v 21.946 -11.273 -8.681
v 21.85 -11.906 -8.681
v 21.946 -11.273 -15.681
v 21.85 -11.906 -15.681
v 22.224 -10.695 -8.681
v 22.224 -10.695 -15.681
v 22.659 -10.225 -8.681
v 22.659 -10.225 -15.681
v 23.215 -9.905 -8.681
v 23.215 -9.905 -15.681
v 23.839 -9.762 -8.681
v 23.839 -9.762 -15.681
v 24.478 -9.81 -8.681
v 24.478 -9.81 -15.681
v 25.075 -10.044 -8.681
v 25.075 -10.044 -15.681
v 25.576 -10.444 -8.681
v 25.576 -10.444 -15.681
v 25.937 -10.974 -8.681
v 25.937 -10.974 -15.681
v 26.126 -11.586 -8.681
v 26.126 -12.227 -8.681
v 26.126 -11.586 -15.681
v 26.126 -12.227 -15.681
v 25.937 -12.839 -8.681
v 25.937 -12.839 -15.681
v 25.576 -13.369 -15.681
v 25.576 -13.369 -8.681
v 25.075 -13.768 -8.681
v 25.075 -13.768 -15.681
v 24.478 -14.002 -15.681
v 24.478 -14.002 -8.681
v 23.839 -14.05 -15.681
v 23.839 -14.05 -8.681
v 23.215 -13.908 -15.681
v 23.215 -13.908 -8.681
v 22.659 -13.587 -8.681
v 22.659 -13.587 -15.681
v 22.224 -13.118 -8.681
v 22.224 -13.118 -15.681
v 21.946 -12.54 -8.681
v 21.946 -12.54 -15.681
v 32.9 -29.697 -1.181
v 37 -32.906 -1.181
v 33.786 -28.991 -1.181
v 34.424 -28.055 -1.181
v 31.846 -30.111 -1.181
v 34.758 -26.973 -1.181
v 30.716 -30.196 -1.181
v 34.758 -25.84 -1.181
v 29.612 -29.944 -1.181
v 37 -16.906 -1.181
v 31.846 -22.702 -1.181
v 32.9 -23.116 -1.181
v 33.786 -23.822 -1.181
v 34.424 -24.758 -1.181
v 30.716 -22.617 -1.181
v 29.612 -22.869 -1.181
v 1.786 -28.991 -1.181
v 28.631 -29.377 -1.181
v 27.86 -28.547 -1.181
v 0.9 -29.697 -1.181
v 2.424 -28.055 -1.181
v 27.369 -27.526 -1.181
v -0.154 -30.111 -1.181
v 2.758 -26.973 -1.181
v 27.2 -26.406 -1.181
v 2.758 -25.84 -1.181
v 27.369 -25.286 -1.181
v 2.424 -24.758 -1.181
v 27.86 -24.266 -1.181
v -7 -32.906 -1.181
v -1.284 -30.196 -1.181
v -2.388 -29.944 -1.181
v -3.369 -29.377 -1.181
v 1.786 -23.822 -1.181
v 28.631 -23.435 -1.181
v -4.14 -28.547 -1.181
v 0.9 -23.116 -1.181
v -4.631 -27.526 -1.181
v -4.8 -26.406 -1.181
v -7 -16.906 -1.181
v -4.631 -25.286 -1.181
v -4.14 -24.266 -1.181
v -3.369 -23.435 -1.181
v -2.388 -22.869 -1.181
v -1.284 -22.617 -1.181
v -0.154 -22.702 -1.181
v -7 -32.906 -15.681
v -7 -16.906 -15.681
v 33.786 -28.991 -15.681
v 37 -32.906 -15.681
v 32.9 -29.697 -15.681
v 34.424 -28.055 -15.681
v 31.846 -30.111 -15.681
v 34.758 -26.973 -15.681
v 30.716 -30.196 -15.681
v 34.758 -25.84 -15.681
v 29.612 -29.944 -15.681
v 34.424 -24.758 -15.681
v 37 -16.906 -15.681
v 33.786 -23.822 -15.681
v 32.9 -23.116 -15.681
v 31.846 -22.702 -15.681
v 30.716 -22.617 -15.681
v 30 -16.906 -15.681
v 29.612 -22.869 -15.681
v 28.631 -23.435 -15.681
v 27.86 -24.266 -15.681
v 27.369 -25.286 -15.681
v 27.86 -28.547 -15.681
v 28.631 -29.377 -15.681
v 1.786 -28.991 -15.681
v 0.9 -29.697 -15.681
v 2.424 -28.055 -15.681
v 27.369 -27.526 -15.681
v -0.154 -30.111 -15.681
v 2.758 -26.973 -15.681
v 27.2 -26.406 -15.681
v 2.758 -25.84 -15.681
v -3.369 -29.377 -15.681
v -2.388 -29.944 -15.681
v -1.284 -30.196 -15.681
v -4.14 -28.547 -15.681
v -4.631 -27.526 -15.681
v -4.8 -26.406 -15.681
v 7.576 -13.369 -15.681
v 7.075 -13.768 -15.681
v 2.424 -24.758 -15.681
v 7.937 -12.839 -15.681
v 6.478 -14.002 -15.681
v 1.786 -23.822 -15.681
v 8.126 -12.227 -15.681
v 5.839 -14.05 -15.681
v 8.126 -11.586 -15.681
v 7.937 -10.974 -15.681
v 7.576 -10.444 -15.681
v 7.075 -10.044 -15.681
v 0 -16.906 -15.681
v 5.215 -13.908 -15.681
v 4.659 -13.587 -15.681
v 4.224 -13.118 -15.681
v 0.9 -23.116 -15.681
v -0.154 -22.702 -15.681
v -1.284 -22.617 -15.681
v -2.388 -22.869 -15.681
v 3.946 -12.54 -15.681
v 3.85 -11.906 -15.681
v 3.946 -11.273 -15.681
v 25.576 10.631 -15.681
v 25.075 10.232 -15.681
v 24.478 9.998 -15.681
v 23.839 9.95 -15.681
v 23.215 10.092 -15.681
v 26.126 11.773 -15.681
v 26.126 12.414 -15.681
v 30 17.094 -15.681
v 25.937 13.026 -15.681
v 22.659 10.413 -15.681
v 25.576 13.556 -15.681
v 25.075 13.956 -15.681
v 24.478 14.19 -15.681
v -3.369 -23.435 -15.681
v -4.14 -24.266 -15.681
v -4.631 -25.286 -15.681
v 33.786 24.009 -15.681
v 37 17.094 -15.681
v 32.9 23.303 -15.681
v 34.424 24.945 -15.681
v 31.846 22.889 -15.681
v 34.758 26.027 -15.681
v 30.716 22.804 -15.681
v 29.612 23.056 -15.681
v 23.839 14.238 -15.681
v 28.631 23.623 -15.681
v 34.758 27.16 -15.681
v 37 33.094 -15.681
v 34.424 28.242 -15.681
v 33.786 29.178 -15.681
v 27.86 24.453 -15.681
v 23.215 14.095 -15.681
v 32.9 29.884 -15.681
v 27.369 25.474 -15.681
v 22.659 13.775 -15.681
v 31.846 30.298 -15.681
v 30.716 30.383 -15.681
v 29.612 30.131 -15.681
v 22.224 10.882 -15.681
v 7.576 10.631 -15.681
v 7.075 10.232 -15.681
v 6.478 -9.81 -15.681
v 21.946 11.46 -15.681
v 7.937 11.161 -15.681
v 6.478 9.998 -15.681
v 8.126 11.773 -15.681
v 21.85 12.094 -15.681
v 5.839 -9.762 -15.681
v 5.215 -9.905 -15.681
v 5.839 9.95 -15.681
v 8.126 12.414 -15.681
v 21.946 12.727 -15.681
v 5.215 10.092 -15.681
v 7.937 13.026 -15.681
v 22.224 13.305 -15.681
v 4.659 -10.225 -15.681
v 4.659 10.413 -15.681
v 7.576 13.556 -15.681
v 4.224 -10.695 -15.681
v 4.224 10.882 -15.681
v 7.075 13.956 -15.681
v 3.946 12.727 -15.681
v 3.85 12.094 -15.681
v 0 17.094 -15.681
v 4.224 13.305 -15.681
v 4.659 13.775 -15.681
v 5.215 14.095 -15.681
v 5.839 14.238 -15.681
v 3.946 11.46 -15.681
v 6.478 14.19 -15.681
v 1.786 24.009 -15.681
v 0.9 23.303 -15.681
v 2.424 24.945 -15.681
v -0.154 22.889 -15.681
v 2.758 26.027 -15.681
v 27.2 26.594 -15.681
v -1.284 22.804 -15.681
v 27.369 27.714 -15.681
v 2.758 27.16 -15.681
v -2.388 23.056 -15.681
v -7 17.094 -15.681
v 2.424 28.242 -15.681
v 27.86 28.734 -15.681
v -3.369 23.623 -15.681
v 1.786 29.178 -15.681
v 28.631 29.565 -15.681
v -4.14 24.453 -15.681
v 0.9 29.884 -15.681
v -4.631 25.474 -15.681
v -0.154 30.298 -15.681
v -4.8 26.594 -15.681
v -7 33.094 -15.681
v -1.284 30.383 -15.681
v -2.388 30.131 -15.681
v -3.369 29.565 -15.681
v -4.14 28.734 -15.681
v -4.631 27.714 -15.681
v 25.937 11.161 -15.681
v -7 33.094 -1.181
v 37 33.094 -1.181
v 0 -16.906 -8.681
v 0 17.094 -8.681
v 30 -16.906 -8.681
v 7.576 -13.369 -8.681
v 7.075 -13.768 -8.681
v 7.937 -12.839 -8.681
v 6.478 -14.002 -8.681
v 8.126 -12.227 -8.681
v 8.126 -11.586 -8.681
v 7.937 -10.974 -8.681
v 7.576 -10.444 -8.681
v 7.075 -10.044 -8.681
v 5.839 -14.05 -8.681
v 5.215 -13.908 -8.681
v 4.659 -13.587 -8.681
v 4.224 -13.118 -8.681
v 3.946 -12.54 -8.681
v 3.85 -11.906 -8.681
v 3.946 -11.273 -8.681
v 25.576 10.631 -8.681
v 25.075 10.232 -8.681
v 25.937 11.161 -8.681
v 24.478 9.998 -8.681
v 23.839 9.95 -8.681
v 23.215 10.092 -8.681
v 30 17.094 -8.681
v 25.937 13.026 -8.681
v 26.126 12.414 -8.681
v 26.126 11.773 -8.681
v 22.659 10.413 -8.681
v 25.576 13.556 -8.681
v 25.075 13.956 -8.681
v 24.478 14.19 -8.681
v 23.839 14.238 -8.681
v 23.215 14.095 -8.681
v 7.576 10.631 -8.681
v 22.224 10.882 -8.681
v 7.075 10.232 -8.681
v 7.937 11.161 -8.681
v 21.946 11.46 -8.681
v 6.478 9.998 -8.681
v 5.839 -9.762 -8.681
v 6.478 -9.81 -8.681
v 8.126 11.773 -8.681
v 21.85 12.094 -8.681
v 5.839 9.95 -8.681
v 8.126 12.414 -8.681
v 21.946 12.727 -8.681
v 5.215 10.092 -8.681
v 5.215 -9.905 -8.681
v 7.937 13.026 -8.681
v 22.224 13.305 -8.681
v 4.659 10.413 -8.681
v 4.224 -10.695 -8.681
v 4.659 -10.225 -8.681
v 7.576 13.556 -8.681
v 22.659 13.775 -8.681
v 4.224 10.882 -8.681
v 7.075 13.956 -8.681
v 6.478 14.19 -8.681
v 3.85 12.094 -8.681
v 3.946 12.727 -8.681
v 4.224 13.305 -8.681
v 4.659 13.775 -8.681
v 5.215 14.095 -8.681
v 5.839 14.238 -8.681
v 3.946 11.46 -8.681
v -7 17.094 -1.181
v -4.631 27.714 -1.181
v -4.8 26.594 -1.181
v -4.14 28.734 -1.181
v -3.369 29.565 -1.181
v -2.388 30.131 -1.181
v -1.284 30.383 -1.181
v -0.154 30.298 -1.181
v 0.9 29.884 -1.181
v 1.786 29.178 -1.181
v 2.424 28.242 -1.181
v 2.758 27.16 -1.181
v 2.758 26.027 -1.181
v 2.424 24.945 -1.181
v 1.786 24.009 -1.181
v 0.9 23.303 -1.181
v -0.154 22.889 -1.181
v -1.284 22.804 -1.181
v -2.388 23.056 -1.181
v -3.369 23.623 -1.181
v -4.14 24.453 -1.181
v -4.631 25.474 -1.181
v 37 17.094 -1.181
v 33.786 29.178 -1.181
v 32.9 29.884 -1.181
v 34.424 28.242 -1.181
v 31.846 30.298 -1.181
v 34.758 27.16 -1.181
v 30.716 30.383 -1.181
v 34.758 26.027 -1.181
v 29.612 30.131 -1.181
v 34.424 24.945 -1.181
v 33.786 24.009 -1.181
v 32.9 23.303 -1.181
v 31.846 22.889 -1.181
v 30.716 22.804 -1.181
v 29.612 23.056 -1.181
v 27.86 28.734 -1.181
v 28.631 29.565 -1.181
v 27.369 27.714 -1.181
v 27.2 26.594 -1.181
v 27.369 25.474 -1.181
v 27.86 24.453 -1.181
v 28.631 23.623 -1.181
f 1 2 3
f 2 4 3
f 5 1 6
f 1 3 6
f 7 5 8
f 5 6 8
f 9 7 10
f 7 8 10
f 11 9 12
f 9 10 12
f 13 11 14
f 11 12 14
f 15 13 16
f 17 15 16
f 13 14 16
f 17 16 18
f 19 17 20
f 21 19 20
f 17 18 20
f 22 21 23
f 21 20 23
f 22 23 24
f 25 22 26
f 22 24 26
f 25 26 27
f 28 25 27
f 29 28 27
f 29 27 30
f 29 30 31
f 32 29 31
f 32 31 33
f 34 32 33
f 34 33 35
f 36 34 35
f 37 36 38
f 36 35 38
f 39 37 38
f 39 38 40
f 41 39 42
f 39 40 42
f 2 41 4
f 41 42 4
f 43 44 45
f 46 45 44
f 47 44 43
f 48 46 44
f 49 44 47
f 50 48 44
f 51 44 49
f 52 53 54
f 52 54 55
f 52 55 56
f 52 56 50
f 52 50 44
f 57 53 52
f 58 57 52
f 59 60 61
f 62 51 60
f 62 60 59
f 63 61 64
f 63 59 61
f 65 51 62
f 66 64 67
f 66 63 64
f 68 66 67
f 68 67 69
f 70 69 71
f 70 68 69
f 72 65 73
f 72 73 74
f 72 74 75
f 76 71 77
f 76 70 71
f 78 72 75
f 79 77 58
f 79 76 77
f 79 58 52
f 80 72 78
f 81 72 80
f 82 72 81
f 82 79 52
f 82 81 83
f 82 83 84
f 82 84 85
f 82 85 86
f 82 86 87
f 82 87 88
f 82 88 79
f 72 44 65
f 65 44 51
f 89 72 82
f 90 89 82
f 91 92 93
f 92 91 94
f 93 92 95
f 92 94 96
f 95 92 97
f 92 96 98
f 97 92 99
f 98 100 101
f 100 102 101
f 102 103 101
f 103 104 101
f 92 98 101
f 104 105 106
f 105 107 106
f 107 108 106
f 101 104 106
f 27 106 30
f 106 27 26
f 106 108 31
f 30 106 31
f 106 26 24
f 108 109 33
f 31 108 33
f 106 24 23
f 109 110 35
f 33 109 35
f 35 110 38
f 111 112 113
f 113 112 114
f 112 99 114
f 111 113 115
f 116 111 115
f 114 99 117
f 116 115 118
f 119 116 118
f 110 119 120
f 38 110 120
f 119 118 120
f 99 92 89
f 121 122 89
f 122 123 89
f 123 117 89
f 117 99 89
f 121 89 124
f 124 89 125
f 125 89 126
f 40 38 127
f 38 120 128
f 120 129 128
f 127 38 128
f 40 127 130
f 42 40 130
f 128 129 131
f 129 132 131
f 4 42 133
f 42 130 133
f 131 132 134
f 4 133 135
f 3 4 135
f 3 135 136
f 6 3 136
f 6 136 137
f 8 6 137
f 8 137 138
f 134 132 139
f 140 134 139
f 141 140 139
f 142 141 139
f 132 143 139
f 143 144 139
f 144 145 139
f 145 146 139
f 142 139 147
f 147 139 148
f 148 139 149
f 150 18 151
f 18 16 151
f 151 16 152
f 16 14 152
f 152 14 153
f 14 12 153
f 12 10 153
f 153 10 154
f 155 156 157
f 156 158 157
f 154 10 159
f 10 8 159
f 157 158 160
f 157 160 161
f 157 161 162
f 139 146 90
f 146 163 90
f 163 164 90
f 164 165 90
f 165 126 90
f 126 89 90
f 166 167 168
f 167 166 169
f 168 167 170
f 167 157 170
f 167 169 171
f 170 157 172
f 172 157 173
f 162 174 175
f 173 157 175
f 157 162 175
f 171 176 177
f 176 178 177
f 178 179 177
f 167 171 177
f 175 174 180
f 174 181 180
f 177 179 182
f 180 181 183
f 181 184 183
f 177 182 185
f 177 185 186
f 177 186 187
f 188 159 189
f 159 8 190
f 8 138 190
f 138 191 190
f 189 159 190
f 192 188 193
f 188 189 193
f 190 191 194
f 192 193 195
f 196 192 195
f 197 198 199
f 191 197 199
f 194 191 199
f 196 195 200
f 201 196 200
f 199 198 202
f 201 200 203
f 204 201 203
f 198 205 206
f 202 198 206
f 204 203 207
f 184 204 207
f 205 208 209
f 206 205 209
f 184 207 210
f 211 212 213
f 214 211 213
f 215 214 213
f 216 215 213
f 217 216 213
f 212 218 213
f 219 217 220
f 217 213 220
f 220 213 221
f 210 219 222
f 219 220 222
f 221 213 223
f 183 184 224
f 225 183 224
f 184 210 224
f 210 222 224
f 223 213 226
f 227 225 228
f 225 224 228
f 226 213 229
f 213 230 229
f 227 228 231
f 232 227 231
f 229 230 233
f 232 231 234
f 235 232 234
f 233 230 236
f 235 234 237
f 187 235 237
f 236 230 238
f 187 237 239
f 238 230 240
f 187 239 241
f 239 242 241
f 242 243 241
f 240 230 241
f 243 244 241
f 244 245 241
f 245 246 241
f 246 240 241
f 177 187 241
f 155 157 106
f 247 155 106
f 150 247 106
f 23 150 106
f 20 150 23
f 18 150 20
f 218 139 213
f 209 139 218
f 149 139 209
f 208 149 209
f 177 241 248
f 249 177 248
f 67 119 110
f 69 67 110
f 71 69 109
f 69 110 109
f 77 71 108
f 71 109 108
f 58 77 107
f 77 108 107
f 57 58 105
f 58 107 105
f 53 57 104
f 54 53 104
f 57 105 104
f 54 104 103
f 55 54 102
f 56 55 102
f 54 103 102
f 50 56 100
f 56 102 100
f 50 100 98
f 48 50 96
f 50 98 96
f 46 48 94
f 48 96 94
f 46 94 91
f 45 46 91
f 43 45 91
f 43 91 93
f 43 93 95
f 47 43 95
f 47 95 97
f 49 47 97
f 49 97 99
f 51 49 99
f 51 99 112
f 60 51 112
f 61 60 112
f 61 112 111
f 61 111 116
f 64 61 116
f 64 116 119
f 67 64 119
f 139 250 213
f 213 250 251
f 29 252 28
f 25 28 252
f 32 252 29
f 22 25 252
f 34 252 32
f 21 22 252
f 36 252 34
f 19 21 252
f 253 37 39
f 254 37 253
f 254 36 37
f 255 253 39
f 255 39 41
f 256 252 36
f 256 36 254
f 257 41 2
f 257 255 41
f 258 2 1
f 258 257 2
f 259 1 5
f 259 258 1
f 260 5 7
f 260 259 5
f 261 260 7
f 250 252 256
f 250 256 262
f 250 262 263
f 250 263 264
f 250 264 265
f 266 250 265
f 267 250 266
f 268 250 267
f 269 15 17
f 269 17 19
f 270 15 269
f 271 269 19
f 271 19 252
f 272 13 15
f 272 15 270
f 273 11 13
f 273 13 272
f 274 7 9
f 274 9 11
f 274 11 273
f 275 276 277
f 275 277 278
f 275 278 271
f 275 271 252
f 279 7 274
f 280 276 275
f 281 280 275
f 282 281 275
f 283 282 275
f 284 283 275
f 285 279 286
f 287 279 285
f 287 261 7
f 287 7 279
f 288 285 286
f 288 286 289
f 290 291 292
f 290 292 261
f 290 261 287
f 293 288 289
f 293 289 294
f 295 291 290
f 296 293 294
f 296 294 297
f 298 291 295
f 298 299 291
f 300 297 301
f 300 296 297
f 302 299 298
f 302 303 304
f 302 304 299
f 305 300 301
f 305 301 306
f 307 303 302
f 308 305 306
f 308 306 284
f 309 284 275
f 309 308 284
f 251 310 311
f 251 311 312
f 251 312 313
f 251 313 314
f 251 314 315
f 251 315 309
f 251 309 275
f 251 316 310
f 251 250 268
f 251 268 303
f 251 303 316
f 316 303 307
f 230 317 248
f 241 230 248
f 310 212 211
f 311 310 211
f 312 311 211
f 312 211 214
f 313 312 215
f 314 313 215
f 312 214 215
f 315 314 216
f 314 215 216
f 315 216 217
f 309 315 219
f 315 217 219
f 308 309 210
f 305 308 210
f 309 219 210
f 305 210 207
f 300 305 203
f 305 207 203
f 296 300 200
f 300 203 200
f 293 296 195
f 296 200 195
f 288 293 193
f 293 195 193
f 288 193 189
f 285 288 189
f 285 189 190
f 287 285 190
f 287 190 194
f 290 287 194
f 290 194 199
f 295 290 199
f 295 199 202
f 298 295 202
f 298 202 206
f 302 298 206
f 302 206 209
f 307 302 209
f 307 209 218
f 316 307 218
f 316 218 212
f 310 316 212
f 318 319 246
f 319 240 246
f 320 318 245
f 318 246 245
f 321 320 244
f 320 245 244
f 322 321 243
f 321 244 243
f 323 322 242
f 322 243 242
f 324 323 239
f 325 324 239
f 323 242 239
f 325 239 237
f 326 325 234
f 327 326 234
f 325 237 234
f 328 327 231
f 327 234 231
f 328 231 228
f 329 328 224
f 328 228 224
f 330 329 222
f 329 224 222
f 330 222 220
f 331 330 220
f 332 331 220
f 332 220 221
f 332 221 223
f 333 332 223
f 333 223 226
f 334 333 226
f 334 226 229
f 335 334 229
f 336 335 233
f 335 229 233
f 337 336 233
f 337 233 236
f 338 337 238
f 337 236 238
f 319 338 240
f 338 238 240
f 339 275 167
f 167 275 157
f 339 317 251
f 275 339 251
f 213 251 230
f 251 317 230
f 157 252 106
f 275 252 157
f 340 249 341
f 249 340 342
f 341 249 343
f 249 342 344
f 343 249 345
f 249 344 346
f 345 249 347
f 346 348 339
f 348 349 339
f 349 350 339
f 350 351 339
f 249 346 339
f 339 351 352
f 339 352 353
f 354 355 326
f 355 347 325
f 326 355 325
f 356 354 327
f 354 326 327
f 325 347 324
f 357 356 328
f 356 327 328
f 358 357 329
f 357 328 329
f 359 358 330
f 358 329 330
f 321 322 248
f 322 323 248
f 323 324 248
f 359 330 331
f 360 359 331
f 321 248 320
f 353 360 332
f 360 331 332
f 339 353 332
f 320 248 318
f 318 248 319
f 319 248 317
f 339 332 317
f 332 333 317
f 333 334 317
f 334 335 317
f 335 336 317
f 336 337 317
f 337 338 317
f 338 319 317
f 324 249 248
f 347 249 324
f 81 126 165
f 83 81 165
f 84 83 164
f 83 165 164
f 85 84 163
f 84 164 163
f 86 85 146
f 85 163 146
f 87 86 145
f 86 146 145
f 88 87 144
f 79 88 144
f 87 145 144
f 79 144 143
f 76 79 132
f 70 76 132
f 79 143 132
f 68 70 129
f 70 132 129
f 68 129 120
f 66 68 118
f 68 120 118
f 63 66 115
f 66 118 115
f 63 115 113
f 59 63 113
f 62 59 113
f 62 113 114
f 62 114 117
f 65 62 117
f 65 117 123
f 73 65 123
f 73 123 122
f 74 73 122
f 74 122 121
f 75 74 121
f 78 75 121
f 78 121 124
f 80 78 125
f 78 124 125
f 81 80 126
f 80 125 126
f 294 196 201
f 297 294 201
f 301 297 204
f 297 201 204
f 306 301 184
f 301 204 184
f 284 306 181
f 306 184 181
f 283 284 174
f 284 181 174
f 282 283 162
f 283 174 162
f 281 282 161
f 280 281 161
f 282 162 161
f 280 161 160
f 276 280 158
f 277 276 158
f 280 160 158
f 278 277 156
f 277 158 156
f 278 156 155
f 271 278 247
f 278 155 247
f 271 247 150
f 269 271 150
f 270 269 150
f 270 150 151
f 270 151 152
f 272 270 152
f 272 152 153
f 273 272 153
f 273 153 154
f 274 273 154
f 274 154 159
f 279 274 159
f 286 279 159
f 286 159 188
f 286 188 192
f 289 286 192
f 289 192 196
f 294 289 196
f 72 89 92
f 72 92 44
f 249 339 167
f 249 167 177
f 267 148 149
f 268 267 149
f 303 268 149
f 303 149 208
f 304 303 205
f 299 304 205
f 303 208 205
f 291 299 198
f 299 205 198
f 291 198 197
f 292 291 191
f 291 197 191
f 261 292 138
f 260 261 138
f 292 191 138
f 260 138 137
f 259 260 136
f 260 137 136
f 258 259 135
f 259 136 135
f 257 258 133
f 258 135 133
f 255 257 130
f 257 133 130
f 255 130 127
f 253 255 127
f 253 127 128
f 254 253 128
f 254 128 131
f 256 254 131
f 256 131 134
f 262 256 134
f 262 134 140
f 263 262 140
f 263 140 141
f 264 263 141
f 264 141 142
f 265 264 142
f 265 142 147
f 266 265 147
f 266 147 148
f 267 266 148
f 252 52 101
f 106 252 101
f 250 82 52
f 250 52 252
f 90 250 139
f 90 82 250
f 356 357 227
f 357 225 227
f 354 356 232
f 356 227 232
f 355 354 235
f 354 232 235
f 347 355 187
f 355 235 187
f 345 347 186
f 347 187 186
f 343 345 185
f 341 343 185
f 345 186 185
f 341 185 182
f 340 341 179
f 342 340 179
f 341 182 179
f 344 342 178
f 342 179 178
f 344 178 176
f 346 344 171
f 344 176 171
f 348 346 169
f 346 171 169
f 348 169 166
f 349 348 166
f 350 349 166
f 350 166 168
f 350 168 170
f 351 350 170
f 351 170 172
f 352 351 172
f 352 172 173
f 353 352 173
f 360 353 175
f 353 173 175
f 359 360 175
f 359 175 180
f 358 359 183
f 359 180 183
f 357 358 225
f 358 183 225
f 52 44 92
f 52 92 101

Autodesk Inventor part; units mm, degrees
ref_plane "YZ Plane" through (0, 0, 0) normal (1, 0, 0) x (0, 1, 0)
ref_plane "XZ Plane" through (0, 0, 0) normal (0, 1, 0) x (-1, 0, 0)
ref_plane "XY Plane" through (0, 0, 0) normal (0, 0, 1) x (1, 0, 0)
sketch "스케치1" plane through (0, 0, 0) normal (1, 0, 0) x (0, 1, 0)
  line L0 (-15.9064, 9.3186) -> (-7.9064, 9.3186)
  line L1 (-7.9064, 9.3186) -> (-3.9064, 13.3186)
  line L2 (-3.9064, 13.3186) -> (4.0936, 13.3186)
  line L3 (4.0936, 13.3186) -> (8.0936, 9.3186)
  line L4 (8.0936, 9.3186) -> (16.0936, 9.3186)
  line L5 (-15.9064, -1.1814) -> (-16.9064, -2.1814)
  line L6 (-16.9064, -2.1814) -> (-16.9064, -7.1814)
  line L7 (-16.9064, -7.1814) -> (-15.9064, -8.1814)
  line L8 (16.0936, 9.3186) -> (16.0936, -1.1814)
  line L9 (16.0936, -1.1814) -> (17.0936, -2.1814)
  line L10 (17.0936, -2.1814) -> (17.0936, -7.1814)
  line L11 (17.0936, -7.1814) -> (16.0936, -8.1814)
  line L12 (16.0936, -8.1814) -> (-15.9064, -8.1814) construction
  line L13 (-15.9064, -8.6814) -> (16.0936, -8.6814) construction
  line L14 (-15.9064, -8.1814) -> (-15.4064, -8.6814)
  line L15 (-15.4064, -8.6814) -> (-4.4064, -8.6814)
  line L16 (-4.4064, -8.6814) -> (-3.9064, -8.1814)
  line L17 (-3.9064, -8.1814) -> (4.0936, -8.1814)
  line L18 (4.0936, -8.1814) -> (4.5936, -8.6814)
  line L19 (16.0936, -8.1814) -> (15.5936, -8.6814)
  line L20 (15.5936, -8.6814) -> (4.5936, -8.6814)
  line L21 (-11.9064, 9.3186) -> (-11.9064, 8.0705)
  line L22 (16.0936, 8.8186) -> (33.0936, 8.8186)
  line L23 (33.0936, 8.8186) -> (33.0936, -1.1814)
  line L24 (33.0936, -1.1814) -> (16.0936, -1.1814)
  line L25 (17.0936, -1.1814) -> (17.0936, -8.6814)
  line L26 (17.0936, -8.6814) -> (33.0936, -8.6814)
  line L27 (33.0936, -8.6814) -> (33.0936, -1.1814)
  line L28 (-15.9064, 8.8186) -> (-32.9064, 8.8186)
  line L29 (-32.9064, 8.8186) -> (-32.9064, -1.1814)
  line L30 (-32.9064, -1.1814) -> (-15.9064, -1.1814)
  line L31 (-15.9064, -1.1814) -> (-15.9064, 9.3186)
  line L32 (-16.9064, -1.1814) -> (-16.9064, -8.6814)
  line L33 (-16.9064, -8.6814) -> (-32.9064, -8.6814)
  line L34 (-32.9064, -8.6814) -> (-32.9064, -1.1814)
  line L35 (17.0936, -8.6814) -> (15.5936, -8.6814)
  line L36 (-16.9064, -8.6814) -> (-15.4064, -8.6814)
  line L37 (-4.4064, -8.6814) -> (4.5936, -8.6814)
  line L38 (-32.9064, -8.6814) -> (-32.9064, -15.6814)
  line L39 (-32.9064, -15.6814) -> (33.0936, -15.6814)
  line L40 (33.0936, -15.6814) -> (33.0936, -8.6814)
  line L41 (17.0936, -8.6814) -> (17.0936, -15.6814)
  line L42 (-16.9064, -8.6814) -> (-16.9064, -15.6814)
  point P0 (0, 0)
  dimension "d0" = 8
  dimension "d1" = 135
  dimension "d2" = 135
  dimension "d3" = 4
  dimension "d4" = 8
  dimension "d5" = 8
  dimension "d6" = 135
  dimension "d7" = 135
  dimension "d8" = 10.5
  dimension "d10" = 135
  dimension "d11" = 1
  dimension "d12" = 1
  dimension "d13" = 135
  dimension "d14" = 135
  dimension "d15" = 135
  dimension "d16" = 1
  dimension "d17" = 10.5
  dimension "d18" = 5
  dimension "d19" = 5
  dimension "d20" = 0.5
  dimension "d21" = 11
  dimension "d22" = 8
  dimension "d23" = 135
  dimension "d24" = 135
  dimension "d25" = 135
  dimension "d26" = 135
  dimension "d27" = 135
  dimension "d28" = 11
  dimension "d29" = 10
  dimension "d30" = 17
  dimension "d32" = 17
extrude "돌출2" add sketch "스케치1" along normal blind 30 contours L36 L15 L37 L20 L35 L41 L39 L42
sketch "스케치3" plane through (0, -16.9064, -15.6814) normal (0, 0, -1) x (-1, 0, 0)
  line L0 (0, 34) -> (-30, 34) projected
  line L1 (-30, 0) -> (-30, 34) projected
  line L2 (-30, 34) -> (-30, 29)
  line L3 (-30, 29) -> (-24, 29)
  circle A0 centre (-24, 29) radius 2.15
  line L4 (-30, 0) -> (-30, 5)
  line L5 (-30, 5) -> (-24, 5)
  circle A1 centre (-24, 5) radius 2.15
  line L6 (0, 34) -> (0, 29)
  line L7 (0, 29) -> (-6, 29)
  circle A2 centre (-6, 29) radius 2.15
  line L8 (0, 0) -> (0, 5)
  line L9 (0, 0) -> (0, 34) projected
  line L10 (0, 5) -> (-6, 5)
  circle A3 centre (-6, 5) radius 2.15
  line L11 (0, 34) -> (0, 43.5)
  line L12 (-30, 43.5) -> (-30, 34)
  line L13 (-15, 34) -> (-15, 43.5)
  line L14 (-15, 43.5) -> (1, 43.5)
  line L15 (-15, 43.5) -> (-31, 43.5)
  circle A4 centre (1, 43.5) radius 3.8
  circle A5 centre (-31, 43.5) radius 3.8
  line L16 (0, 0) -> (0, -9.5)
  line L17 (-15, -9.5) -> (-15, 0)
  line L18 (-30, -9.5) -> (-30, 0)
  line L19 (-15, -9.5) -> (-31, -9.5)
  line L20 (-15, -9.5) -> (1, -9.5)
  circle A6 centre (-31, -9.5) radius 3.8
  circle A7 centre (1, -9.5) radius 3.8
  point P0 (0, 16.9064)
  dimension "d38" = 5
  dimension "d39" = 6
  dimension "d40" = 4.3
  dimension "d41" = 5
  dimension "d42" = 6
  dimension "d43" = 4.3
  dimension "d44" = 5
  dimension "d45" = 6
  dimension "d46" = 4.3
  dimension "d47" = 5
  dimension "d48" = 6
  dimension "d49" = 4.3
  dimension "d54" = 9.5
  dimension "d55" = 16
  dimension "d56" = 16
  dimension "d57" = 7.6
  dimension "d58" = 7.6
  dimension "d61" = 9.5
  dimension "d62" = 15
  dimension "d67" = 16
  dimension "d68" = 16
  dimension "d69" = 7.6
  dimension "d70" = 7.6
extrude "돌출3" add sketch "스케치1" along normal blind 37 and the other way blind 7 contours L30 L32 L6 L33 L34 | L33 L42 L39 L38 | L41 L26 L40 L39 | L25 L10 L24 L27 L26
extrude "돌출4" cut sketch "스케치3" against normal blind 10 contours A0 | A1 | A3 | A2
extrude "돌출6" cut sketch "스케치3" against normal blind 20 contours A4 L14 L11 | L11 L14 A4 | A5 L15 L12 | L12 L15 A5 | A7 L20 L16 | L16 L20 A7 | A6 L19 L18 | L18 L19 A6
equation "\"d14\" = d13"
equation "\"d15\" = d13"
equation "\"d17\" = d8"
properties part number "xy 조인트"
